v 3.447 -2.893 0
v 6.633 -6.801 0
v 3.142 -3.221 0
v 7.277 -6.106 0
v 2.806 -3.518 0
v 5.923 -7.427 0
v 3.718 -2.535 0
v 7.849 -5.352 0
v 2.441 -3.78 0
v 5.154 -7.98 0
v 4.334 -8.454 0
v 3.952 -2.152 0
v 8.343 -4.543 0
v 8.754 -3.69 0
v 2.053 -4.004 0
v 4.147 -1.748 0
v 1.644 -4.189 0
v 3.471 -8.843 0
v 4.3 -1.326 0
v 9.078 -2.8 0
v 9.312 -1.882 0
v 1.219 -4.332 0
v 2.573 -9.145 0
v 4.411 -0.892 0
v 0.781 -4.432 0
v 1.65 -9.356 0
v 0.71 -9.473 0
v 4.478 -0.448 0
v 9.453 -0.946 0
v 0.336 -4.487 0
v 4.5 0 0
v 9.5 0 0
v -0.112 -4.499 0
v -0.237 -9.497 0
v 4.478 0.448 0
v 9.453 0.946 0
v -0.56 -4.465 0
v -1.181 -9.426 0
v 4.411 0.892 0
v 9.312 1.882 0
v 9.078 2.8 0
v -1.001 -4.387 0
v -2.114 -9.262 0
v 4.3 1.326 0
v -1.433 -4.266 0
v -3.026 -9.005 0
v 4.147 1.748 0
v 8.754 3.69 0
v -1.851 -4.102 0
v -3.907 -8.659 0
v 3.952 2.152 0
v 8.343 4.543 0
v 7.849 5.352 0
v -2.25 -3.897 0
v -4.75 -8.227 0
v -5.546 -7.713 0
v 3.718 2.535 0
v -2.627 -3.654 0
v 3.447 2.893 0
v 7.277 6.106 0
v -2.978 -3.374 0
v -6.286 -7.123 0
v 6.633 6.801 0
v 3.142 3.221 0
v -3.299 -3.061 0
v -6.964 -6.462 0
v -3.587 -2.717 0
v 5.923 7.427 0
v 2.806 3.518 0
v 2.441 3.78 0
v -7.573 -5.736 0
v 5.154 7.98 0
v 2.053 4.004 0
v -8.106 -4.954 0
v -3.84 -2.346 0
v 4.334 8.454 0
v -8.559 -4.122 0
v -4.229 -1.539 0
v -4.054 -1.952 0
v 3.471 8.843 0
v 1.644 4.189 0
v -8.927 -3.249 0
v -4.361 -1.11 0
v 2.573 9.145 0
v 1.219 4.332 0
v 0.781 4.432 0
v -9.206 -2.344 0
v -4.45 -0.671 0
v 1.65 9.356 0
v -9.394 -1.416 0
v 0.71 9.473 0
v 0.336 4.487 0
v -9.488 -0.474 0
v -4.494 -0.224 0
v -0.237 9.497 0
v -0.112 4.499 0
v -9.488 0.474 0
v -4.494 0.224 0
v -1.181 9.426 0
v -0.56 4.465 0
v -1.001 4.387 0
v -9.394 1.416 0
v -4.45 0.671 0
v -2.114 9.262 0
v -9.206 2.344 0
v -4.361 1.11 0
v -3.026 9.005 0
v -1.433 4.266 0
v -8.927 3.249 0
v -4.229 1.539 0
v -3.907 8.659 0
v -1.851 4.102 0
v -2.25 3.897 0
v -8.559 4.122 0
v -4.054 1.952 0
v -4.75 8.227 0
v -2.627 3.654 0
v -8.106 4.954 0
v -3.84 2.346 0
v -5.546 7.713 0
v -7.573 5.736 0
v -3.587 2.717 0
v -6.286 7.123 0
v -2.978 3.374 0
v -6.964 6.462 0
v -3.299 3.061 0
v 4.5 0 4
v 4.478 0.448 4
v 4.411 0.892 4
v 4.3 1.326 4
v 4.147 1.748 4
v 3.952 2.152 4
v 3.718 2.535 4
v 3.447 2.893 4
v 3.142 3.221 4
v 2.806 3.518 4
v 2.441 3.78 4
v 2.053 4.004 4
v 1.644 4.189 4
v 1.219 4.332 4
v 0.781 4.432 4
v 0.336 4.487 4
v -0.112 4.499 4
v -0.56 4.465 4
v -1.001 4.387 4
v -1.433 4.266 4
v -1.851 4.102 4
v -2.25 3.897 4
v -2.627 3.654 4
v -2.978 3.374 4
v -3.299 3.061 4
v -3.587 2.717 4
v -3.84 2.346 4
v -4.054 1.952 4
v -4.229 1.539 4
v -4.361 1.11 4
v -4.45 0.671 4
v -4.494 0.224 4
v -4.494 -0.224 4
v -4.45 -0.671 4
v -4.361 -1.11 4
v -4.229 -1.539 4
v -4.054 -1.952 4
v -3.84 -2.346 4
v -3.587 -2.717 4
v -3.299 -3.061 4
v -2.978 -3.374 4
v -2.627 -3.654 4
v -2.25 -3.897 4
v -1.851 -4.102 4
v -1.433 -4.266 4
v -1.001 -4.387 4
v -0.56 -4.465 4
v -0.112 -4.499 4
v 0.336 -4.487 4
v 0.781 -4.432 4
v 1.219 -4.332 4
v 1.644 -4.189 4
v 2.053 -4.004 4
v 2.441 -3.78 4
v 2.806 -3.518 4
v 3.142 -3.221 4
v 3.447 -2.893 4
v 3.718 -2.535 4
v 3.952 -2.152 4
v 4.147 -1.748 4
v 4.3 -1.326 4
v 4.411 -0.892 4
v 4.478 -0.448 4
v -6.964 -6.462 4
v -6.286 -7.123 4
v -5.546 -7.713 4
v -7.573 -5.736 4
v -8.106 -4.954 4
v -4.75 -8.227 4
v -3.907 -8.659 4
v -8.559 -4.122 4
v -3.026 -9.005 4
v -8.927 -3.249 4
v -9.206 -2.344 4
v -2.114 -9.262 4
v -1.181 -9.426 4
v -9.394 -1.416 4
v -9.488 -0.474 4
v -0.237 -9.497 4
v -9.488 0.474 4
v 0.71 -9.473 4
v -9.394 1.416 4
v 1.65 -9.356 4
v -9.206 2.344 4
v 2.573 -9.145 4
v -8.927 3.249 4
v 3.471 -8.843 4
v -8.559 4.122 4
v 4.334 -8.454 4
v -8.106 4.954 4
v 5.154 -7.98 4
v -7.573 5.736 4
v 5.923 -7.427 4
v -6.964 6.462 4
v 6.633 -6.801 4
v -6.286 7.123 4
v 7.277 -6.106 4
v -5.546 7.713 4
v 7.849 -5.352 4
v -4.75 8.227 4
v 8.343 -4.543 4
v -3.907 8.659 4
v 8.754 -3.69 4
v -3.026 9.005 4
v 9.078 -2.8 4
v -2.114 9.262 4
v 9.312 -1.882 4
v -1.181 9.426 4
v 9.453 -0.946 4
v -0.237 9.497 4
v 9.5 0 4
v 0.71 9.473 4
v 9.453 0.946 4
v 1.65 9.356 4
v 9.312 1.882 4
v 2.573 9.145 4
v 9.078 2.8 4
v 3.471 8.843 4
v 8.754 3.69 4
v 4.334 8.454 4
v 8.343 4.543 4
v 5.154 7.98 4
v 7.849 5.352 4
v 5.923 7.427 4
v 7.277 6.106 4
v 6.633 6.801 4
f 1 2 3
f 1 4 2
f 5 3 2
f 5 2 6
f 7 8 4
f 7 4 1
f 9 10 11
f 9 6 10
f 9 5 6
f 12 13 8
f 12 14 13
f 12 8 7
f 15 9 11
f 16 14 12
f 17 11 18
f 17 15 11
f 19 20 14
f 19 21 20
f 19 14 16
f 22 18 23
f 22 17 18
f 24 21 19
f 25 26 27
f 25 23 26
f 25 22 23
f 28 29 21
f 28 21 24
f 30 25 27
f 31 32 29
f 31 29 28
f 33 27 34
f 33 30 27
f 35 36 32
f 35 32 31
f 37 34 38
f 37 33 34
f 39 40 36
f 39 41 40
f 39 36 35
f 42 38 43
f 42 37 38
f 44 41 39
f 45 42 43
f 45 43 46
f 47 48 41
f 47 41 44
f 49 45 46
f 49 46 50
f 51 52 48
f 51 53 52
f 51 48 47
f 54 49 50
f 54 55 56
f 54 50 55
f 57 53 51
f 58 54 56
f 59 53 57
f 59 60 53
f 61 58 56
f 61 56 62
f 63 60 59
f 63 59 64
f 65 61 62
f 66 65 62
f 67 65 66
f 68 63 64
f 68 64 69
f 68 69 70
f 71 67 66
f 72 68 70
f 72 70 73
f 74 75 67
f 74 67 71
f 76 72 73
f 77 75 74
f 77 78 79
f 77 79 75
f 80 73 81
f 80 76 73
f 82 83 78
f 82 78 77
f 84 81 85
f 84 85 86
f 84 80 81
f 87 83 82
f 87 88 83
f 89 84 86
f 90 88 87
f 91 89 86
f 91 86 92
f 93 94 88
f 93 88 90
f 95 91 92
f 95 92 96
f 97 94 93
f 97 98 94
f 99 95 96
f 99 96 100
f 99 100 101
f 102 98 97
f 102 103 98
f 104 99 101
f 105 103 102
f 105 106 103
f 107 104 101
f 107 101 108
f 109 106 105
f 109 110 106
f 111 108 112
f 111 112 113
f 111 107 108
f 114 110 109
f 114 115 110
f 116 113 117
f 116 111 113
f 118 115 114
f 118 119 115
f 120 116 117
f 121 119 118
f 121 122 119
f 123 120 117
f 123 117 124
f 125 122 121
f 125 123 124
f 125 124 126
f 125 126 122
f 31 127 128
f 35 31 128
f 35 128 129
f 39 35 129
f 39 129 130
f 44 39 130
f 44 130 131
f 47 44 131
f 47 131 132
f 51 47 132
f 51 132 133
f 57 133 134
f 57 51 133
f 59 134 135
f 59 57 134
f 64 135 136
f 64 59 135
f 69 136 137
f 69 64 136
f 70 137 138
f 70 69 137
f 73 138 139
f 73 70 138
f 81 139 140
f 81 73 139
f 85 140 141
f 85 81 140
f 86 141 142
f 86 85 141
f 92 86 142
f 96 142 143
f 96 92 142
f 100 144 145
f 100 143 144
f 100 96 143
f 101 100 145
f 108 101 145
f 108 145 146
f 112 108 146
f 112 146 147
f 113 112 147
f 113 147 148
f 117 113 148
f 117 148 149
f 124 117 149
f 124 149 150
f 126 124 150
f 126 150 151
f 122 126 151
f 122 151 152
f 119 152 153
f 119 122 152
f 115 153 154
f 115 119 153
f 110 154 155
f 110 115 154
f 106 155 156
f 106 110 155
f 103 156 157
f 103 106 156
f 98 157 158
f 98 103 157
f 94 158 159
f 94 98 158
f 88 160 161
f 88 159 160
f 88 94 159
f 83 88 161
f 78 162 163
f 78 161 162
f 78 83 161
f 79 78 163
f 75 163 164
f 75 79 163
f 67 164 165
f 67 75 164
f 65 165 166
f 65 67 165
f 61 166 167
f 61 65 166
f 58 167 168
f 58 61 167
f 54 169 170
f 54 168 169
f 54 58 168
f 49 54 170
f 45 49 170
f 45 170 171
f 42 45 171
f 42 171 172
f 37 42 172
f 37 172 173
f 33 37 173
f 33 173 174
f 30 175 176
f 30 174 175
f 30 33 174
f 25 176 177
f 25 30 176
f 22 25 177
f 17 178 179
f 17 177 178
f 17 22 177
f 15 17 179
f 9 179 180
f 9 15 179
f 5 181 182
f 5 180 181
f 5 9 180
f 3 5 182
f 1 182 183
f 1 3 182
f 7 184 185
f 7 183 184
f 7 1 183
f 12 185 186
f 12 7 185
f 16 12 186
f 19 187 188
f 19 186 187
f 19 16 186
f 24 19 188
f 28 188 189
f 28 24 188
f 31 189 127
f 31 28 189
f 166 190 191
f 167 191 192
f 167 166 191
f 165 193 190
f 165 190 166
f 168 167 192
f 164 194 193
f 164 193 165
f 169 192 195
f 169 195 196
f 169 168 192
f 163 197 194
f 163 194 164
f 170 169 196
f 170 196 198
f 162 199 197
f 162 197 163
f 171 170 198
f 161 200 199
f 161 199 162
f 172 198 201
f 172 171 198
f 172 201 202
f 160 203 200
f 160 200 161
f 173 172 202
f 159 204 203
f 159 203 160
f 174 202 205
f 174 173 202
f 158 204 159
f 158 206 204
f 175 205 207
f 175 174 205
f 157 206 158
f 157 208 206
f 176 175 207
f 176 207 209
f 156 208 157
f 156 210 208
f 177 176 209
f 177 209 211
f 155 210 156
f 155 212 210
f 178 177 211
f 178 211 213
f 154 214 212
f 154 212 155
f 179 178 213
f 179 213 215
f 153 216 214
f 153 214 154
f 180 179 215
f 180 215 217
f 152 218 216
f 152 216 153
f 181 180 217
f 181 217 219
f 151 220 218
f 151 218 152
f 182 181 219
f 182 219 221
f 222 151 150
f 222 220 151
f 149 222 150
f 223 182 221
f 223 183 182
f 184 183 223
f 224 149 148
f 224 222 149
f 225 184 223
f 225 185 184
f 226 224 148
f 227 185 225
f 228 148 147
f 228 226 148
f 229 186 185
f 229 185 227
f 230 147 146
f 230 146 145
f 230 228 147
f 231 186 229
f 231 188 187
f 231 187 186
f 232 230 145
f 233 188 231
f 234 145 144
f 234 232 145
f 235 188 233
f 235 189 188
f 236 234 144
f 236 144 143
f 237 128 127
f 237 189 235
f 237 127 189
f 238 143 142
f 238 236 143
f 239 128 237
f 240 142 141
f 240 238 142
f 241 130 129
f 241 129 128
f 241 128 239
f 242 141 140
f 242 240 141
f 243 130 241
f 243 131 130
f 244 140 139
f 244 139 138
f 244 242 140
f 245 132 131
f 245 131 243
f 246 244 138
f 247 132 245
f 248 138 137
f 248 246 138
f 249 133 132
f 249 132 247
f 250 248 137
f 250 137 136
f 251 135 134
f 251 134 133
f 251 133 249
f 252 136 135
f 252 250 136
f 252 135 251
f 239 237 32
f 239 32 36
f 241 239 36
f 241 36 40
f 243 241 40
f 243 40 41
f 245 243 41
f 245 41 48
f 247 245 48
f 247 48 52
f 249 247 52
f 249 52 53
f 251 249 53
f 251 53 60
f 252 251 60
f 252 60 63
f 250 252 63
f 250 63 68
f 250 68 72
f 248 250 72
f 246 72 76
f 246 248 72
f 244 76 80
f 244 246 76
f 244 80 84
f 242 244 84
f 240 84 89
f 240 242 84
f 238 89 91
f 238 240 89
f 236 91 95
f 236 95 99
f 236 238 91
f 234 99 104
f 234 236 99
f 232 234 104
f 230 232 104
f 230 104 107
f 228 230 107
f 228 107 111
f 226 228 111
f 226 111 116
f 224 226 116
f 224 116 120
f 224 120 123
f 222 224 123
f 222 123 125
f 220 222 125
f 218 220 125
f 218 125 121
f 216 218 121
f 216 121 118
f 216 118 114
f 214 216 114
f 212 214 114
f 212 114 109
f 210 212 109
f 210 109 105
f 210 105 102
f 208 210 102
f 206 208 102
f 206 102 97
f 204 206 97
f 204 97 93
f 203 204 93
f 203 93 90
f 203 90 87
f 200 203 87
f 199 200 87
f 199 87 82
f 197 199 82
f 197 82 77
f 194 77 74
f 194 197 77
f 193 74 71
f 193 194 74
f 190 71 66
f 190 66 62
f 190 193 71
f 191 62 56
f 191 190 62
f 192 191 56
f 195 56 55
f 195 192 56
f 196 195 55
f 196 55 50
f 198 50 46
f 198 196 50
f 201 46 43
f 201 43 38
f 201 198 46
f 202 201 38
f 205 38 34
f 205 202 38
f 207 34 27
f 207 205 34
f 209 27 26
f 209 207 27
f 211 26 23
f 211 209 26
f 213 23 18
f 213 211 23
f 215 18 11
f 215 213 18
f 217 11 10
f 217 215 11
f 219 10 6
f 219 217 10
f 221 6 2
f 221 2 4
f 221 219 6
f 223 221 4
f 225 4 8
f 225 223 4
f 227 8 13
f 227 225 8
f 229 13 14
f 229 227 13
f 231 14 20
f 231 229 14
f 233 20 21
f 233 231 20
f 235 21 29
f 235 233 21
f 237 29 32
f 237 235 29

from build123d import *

# Parameters (mm, degrees)
SKETCH001_R  = 65
PAD_DEPTH    = 4
SKETCH002_R  = 9.5
PAD001_DEPTH = 10


with BuildPart() as body001:
    # Sketch001 → Pad (new body)
    with BuildSketch(Plane.XY):
        Circle(SKETCH001_R)
    extrude(amount=PAD_DEPTH)


with BuildPart() as body002:
    # Sketch002 → Pad001 (new body)
    with BuildSketch(Plane.XY):
        Circle(SKETCH002_R)
    extrude(amount=PAD001_DEPTH)


with BuildPart() as body:
    # Sketch → Revolution (revolve)
    with BuildSketch(Plane.XZ):
        Polygon((4.5, 10), (4.5, 0), (56.757359, 0), (58.757359, 2), (61.242641, 2), (63.242641, 0), (95.232233, 0), (97, 1.767767), (97, 12.5), (96, 12.5), (96, 2.181981), (94.818019, 1), (63.656854, 1), (62.242641, 2.414214), (62.242641, 12.5), (61.242641, 12.5), (61.242641, 4), (57.928932, 4), (55.928932, 2), (9.5, 2), (9.5, 10), align=None)
    revolve(axis=Axis((0, 0, 0), (0, 0, 1)))

    # Boolean: intersect Body001
    add(body001.part, mode=Mode.INTERSECT)

    # Boolean001: intersect Body002
    add(body002.part, mode=Mode.INTERSECT)


solid = body.part
